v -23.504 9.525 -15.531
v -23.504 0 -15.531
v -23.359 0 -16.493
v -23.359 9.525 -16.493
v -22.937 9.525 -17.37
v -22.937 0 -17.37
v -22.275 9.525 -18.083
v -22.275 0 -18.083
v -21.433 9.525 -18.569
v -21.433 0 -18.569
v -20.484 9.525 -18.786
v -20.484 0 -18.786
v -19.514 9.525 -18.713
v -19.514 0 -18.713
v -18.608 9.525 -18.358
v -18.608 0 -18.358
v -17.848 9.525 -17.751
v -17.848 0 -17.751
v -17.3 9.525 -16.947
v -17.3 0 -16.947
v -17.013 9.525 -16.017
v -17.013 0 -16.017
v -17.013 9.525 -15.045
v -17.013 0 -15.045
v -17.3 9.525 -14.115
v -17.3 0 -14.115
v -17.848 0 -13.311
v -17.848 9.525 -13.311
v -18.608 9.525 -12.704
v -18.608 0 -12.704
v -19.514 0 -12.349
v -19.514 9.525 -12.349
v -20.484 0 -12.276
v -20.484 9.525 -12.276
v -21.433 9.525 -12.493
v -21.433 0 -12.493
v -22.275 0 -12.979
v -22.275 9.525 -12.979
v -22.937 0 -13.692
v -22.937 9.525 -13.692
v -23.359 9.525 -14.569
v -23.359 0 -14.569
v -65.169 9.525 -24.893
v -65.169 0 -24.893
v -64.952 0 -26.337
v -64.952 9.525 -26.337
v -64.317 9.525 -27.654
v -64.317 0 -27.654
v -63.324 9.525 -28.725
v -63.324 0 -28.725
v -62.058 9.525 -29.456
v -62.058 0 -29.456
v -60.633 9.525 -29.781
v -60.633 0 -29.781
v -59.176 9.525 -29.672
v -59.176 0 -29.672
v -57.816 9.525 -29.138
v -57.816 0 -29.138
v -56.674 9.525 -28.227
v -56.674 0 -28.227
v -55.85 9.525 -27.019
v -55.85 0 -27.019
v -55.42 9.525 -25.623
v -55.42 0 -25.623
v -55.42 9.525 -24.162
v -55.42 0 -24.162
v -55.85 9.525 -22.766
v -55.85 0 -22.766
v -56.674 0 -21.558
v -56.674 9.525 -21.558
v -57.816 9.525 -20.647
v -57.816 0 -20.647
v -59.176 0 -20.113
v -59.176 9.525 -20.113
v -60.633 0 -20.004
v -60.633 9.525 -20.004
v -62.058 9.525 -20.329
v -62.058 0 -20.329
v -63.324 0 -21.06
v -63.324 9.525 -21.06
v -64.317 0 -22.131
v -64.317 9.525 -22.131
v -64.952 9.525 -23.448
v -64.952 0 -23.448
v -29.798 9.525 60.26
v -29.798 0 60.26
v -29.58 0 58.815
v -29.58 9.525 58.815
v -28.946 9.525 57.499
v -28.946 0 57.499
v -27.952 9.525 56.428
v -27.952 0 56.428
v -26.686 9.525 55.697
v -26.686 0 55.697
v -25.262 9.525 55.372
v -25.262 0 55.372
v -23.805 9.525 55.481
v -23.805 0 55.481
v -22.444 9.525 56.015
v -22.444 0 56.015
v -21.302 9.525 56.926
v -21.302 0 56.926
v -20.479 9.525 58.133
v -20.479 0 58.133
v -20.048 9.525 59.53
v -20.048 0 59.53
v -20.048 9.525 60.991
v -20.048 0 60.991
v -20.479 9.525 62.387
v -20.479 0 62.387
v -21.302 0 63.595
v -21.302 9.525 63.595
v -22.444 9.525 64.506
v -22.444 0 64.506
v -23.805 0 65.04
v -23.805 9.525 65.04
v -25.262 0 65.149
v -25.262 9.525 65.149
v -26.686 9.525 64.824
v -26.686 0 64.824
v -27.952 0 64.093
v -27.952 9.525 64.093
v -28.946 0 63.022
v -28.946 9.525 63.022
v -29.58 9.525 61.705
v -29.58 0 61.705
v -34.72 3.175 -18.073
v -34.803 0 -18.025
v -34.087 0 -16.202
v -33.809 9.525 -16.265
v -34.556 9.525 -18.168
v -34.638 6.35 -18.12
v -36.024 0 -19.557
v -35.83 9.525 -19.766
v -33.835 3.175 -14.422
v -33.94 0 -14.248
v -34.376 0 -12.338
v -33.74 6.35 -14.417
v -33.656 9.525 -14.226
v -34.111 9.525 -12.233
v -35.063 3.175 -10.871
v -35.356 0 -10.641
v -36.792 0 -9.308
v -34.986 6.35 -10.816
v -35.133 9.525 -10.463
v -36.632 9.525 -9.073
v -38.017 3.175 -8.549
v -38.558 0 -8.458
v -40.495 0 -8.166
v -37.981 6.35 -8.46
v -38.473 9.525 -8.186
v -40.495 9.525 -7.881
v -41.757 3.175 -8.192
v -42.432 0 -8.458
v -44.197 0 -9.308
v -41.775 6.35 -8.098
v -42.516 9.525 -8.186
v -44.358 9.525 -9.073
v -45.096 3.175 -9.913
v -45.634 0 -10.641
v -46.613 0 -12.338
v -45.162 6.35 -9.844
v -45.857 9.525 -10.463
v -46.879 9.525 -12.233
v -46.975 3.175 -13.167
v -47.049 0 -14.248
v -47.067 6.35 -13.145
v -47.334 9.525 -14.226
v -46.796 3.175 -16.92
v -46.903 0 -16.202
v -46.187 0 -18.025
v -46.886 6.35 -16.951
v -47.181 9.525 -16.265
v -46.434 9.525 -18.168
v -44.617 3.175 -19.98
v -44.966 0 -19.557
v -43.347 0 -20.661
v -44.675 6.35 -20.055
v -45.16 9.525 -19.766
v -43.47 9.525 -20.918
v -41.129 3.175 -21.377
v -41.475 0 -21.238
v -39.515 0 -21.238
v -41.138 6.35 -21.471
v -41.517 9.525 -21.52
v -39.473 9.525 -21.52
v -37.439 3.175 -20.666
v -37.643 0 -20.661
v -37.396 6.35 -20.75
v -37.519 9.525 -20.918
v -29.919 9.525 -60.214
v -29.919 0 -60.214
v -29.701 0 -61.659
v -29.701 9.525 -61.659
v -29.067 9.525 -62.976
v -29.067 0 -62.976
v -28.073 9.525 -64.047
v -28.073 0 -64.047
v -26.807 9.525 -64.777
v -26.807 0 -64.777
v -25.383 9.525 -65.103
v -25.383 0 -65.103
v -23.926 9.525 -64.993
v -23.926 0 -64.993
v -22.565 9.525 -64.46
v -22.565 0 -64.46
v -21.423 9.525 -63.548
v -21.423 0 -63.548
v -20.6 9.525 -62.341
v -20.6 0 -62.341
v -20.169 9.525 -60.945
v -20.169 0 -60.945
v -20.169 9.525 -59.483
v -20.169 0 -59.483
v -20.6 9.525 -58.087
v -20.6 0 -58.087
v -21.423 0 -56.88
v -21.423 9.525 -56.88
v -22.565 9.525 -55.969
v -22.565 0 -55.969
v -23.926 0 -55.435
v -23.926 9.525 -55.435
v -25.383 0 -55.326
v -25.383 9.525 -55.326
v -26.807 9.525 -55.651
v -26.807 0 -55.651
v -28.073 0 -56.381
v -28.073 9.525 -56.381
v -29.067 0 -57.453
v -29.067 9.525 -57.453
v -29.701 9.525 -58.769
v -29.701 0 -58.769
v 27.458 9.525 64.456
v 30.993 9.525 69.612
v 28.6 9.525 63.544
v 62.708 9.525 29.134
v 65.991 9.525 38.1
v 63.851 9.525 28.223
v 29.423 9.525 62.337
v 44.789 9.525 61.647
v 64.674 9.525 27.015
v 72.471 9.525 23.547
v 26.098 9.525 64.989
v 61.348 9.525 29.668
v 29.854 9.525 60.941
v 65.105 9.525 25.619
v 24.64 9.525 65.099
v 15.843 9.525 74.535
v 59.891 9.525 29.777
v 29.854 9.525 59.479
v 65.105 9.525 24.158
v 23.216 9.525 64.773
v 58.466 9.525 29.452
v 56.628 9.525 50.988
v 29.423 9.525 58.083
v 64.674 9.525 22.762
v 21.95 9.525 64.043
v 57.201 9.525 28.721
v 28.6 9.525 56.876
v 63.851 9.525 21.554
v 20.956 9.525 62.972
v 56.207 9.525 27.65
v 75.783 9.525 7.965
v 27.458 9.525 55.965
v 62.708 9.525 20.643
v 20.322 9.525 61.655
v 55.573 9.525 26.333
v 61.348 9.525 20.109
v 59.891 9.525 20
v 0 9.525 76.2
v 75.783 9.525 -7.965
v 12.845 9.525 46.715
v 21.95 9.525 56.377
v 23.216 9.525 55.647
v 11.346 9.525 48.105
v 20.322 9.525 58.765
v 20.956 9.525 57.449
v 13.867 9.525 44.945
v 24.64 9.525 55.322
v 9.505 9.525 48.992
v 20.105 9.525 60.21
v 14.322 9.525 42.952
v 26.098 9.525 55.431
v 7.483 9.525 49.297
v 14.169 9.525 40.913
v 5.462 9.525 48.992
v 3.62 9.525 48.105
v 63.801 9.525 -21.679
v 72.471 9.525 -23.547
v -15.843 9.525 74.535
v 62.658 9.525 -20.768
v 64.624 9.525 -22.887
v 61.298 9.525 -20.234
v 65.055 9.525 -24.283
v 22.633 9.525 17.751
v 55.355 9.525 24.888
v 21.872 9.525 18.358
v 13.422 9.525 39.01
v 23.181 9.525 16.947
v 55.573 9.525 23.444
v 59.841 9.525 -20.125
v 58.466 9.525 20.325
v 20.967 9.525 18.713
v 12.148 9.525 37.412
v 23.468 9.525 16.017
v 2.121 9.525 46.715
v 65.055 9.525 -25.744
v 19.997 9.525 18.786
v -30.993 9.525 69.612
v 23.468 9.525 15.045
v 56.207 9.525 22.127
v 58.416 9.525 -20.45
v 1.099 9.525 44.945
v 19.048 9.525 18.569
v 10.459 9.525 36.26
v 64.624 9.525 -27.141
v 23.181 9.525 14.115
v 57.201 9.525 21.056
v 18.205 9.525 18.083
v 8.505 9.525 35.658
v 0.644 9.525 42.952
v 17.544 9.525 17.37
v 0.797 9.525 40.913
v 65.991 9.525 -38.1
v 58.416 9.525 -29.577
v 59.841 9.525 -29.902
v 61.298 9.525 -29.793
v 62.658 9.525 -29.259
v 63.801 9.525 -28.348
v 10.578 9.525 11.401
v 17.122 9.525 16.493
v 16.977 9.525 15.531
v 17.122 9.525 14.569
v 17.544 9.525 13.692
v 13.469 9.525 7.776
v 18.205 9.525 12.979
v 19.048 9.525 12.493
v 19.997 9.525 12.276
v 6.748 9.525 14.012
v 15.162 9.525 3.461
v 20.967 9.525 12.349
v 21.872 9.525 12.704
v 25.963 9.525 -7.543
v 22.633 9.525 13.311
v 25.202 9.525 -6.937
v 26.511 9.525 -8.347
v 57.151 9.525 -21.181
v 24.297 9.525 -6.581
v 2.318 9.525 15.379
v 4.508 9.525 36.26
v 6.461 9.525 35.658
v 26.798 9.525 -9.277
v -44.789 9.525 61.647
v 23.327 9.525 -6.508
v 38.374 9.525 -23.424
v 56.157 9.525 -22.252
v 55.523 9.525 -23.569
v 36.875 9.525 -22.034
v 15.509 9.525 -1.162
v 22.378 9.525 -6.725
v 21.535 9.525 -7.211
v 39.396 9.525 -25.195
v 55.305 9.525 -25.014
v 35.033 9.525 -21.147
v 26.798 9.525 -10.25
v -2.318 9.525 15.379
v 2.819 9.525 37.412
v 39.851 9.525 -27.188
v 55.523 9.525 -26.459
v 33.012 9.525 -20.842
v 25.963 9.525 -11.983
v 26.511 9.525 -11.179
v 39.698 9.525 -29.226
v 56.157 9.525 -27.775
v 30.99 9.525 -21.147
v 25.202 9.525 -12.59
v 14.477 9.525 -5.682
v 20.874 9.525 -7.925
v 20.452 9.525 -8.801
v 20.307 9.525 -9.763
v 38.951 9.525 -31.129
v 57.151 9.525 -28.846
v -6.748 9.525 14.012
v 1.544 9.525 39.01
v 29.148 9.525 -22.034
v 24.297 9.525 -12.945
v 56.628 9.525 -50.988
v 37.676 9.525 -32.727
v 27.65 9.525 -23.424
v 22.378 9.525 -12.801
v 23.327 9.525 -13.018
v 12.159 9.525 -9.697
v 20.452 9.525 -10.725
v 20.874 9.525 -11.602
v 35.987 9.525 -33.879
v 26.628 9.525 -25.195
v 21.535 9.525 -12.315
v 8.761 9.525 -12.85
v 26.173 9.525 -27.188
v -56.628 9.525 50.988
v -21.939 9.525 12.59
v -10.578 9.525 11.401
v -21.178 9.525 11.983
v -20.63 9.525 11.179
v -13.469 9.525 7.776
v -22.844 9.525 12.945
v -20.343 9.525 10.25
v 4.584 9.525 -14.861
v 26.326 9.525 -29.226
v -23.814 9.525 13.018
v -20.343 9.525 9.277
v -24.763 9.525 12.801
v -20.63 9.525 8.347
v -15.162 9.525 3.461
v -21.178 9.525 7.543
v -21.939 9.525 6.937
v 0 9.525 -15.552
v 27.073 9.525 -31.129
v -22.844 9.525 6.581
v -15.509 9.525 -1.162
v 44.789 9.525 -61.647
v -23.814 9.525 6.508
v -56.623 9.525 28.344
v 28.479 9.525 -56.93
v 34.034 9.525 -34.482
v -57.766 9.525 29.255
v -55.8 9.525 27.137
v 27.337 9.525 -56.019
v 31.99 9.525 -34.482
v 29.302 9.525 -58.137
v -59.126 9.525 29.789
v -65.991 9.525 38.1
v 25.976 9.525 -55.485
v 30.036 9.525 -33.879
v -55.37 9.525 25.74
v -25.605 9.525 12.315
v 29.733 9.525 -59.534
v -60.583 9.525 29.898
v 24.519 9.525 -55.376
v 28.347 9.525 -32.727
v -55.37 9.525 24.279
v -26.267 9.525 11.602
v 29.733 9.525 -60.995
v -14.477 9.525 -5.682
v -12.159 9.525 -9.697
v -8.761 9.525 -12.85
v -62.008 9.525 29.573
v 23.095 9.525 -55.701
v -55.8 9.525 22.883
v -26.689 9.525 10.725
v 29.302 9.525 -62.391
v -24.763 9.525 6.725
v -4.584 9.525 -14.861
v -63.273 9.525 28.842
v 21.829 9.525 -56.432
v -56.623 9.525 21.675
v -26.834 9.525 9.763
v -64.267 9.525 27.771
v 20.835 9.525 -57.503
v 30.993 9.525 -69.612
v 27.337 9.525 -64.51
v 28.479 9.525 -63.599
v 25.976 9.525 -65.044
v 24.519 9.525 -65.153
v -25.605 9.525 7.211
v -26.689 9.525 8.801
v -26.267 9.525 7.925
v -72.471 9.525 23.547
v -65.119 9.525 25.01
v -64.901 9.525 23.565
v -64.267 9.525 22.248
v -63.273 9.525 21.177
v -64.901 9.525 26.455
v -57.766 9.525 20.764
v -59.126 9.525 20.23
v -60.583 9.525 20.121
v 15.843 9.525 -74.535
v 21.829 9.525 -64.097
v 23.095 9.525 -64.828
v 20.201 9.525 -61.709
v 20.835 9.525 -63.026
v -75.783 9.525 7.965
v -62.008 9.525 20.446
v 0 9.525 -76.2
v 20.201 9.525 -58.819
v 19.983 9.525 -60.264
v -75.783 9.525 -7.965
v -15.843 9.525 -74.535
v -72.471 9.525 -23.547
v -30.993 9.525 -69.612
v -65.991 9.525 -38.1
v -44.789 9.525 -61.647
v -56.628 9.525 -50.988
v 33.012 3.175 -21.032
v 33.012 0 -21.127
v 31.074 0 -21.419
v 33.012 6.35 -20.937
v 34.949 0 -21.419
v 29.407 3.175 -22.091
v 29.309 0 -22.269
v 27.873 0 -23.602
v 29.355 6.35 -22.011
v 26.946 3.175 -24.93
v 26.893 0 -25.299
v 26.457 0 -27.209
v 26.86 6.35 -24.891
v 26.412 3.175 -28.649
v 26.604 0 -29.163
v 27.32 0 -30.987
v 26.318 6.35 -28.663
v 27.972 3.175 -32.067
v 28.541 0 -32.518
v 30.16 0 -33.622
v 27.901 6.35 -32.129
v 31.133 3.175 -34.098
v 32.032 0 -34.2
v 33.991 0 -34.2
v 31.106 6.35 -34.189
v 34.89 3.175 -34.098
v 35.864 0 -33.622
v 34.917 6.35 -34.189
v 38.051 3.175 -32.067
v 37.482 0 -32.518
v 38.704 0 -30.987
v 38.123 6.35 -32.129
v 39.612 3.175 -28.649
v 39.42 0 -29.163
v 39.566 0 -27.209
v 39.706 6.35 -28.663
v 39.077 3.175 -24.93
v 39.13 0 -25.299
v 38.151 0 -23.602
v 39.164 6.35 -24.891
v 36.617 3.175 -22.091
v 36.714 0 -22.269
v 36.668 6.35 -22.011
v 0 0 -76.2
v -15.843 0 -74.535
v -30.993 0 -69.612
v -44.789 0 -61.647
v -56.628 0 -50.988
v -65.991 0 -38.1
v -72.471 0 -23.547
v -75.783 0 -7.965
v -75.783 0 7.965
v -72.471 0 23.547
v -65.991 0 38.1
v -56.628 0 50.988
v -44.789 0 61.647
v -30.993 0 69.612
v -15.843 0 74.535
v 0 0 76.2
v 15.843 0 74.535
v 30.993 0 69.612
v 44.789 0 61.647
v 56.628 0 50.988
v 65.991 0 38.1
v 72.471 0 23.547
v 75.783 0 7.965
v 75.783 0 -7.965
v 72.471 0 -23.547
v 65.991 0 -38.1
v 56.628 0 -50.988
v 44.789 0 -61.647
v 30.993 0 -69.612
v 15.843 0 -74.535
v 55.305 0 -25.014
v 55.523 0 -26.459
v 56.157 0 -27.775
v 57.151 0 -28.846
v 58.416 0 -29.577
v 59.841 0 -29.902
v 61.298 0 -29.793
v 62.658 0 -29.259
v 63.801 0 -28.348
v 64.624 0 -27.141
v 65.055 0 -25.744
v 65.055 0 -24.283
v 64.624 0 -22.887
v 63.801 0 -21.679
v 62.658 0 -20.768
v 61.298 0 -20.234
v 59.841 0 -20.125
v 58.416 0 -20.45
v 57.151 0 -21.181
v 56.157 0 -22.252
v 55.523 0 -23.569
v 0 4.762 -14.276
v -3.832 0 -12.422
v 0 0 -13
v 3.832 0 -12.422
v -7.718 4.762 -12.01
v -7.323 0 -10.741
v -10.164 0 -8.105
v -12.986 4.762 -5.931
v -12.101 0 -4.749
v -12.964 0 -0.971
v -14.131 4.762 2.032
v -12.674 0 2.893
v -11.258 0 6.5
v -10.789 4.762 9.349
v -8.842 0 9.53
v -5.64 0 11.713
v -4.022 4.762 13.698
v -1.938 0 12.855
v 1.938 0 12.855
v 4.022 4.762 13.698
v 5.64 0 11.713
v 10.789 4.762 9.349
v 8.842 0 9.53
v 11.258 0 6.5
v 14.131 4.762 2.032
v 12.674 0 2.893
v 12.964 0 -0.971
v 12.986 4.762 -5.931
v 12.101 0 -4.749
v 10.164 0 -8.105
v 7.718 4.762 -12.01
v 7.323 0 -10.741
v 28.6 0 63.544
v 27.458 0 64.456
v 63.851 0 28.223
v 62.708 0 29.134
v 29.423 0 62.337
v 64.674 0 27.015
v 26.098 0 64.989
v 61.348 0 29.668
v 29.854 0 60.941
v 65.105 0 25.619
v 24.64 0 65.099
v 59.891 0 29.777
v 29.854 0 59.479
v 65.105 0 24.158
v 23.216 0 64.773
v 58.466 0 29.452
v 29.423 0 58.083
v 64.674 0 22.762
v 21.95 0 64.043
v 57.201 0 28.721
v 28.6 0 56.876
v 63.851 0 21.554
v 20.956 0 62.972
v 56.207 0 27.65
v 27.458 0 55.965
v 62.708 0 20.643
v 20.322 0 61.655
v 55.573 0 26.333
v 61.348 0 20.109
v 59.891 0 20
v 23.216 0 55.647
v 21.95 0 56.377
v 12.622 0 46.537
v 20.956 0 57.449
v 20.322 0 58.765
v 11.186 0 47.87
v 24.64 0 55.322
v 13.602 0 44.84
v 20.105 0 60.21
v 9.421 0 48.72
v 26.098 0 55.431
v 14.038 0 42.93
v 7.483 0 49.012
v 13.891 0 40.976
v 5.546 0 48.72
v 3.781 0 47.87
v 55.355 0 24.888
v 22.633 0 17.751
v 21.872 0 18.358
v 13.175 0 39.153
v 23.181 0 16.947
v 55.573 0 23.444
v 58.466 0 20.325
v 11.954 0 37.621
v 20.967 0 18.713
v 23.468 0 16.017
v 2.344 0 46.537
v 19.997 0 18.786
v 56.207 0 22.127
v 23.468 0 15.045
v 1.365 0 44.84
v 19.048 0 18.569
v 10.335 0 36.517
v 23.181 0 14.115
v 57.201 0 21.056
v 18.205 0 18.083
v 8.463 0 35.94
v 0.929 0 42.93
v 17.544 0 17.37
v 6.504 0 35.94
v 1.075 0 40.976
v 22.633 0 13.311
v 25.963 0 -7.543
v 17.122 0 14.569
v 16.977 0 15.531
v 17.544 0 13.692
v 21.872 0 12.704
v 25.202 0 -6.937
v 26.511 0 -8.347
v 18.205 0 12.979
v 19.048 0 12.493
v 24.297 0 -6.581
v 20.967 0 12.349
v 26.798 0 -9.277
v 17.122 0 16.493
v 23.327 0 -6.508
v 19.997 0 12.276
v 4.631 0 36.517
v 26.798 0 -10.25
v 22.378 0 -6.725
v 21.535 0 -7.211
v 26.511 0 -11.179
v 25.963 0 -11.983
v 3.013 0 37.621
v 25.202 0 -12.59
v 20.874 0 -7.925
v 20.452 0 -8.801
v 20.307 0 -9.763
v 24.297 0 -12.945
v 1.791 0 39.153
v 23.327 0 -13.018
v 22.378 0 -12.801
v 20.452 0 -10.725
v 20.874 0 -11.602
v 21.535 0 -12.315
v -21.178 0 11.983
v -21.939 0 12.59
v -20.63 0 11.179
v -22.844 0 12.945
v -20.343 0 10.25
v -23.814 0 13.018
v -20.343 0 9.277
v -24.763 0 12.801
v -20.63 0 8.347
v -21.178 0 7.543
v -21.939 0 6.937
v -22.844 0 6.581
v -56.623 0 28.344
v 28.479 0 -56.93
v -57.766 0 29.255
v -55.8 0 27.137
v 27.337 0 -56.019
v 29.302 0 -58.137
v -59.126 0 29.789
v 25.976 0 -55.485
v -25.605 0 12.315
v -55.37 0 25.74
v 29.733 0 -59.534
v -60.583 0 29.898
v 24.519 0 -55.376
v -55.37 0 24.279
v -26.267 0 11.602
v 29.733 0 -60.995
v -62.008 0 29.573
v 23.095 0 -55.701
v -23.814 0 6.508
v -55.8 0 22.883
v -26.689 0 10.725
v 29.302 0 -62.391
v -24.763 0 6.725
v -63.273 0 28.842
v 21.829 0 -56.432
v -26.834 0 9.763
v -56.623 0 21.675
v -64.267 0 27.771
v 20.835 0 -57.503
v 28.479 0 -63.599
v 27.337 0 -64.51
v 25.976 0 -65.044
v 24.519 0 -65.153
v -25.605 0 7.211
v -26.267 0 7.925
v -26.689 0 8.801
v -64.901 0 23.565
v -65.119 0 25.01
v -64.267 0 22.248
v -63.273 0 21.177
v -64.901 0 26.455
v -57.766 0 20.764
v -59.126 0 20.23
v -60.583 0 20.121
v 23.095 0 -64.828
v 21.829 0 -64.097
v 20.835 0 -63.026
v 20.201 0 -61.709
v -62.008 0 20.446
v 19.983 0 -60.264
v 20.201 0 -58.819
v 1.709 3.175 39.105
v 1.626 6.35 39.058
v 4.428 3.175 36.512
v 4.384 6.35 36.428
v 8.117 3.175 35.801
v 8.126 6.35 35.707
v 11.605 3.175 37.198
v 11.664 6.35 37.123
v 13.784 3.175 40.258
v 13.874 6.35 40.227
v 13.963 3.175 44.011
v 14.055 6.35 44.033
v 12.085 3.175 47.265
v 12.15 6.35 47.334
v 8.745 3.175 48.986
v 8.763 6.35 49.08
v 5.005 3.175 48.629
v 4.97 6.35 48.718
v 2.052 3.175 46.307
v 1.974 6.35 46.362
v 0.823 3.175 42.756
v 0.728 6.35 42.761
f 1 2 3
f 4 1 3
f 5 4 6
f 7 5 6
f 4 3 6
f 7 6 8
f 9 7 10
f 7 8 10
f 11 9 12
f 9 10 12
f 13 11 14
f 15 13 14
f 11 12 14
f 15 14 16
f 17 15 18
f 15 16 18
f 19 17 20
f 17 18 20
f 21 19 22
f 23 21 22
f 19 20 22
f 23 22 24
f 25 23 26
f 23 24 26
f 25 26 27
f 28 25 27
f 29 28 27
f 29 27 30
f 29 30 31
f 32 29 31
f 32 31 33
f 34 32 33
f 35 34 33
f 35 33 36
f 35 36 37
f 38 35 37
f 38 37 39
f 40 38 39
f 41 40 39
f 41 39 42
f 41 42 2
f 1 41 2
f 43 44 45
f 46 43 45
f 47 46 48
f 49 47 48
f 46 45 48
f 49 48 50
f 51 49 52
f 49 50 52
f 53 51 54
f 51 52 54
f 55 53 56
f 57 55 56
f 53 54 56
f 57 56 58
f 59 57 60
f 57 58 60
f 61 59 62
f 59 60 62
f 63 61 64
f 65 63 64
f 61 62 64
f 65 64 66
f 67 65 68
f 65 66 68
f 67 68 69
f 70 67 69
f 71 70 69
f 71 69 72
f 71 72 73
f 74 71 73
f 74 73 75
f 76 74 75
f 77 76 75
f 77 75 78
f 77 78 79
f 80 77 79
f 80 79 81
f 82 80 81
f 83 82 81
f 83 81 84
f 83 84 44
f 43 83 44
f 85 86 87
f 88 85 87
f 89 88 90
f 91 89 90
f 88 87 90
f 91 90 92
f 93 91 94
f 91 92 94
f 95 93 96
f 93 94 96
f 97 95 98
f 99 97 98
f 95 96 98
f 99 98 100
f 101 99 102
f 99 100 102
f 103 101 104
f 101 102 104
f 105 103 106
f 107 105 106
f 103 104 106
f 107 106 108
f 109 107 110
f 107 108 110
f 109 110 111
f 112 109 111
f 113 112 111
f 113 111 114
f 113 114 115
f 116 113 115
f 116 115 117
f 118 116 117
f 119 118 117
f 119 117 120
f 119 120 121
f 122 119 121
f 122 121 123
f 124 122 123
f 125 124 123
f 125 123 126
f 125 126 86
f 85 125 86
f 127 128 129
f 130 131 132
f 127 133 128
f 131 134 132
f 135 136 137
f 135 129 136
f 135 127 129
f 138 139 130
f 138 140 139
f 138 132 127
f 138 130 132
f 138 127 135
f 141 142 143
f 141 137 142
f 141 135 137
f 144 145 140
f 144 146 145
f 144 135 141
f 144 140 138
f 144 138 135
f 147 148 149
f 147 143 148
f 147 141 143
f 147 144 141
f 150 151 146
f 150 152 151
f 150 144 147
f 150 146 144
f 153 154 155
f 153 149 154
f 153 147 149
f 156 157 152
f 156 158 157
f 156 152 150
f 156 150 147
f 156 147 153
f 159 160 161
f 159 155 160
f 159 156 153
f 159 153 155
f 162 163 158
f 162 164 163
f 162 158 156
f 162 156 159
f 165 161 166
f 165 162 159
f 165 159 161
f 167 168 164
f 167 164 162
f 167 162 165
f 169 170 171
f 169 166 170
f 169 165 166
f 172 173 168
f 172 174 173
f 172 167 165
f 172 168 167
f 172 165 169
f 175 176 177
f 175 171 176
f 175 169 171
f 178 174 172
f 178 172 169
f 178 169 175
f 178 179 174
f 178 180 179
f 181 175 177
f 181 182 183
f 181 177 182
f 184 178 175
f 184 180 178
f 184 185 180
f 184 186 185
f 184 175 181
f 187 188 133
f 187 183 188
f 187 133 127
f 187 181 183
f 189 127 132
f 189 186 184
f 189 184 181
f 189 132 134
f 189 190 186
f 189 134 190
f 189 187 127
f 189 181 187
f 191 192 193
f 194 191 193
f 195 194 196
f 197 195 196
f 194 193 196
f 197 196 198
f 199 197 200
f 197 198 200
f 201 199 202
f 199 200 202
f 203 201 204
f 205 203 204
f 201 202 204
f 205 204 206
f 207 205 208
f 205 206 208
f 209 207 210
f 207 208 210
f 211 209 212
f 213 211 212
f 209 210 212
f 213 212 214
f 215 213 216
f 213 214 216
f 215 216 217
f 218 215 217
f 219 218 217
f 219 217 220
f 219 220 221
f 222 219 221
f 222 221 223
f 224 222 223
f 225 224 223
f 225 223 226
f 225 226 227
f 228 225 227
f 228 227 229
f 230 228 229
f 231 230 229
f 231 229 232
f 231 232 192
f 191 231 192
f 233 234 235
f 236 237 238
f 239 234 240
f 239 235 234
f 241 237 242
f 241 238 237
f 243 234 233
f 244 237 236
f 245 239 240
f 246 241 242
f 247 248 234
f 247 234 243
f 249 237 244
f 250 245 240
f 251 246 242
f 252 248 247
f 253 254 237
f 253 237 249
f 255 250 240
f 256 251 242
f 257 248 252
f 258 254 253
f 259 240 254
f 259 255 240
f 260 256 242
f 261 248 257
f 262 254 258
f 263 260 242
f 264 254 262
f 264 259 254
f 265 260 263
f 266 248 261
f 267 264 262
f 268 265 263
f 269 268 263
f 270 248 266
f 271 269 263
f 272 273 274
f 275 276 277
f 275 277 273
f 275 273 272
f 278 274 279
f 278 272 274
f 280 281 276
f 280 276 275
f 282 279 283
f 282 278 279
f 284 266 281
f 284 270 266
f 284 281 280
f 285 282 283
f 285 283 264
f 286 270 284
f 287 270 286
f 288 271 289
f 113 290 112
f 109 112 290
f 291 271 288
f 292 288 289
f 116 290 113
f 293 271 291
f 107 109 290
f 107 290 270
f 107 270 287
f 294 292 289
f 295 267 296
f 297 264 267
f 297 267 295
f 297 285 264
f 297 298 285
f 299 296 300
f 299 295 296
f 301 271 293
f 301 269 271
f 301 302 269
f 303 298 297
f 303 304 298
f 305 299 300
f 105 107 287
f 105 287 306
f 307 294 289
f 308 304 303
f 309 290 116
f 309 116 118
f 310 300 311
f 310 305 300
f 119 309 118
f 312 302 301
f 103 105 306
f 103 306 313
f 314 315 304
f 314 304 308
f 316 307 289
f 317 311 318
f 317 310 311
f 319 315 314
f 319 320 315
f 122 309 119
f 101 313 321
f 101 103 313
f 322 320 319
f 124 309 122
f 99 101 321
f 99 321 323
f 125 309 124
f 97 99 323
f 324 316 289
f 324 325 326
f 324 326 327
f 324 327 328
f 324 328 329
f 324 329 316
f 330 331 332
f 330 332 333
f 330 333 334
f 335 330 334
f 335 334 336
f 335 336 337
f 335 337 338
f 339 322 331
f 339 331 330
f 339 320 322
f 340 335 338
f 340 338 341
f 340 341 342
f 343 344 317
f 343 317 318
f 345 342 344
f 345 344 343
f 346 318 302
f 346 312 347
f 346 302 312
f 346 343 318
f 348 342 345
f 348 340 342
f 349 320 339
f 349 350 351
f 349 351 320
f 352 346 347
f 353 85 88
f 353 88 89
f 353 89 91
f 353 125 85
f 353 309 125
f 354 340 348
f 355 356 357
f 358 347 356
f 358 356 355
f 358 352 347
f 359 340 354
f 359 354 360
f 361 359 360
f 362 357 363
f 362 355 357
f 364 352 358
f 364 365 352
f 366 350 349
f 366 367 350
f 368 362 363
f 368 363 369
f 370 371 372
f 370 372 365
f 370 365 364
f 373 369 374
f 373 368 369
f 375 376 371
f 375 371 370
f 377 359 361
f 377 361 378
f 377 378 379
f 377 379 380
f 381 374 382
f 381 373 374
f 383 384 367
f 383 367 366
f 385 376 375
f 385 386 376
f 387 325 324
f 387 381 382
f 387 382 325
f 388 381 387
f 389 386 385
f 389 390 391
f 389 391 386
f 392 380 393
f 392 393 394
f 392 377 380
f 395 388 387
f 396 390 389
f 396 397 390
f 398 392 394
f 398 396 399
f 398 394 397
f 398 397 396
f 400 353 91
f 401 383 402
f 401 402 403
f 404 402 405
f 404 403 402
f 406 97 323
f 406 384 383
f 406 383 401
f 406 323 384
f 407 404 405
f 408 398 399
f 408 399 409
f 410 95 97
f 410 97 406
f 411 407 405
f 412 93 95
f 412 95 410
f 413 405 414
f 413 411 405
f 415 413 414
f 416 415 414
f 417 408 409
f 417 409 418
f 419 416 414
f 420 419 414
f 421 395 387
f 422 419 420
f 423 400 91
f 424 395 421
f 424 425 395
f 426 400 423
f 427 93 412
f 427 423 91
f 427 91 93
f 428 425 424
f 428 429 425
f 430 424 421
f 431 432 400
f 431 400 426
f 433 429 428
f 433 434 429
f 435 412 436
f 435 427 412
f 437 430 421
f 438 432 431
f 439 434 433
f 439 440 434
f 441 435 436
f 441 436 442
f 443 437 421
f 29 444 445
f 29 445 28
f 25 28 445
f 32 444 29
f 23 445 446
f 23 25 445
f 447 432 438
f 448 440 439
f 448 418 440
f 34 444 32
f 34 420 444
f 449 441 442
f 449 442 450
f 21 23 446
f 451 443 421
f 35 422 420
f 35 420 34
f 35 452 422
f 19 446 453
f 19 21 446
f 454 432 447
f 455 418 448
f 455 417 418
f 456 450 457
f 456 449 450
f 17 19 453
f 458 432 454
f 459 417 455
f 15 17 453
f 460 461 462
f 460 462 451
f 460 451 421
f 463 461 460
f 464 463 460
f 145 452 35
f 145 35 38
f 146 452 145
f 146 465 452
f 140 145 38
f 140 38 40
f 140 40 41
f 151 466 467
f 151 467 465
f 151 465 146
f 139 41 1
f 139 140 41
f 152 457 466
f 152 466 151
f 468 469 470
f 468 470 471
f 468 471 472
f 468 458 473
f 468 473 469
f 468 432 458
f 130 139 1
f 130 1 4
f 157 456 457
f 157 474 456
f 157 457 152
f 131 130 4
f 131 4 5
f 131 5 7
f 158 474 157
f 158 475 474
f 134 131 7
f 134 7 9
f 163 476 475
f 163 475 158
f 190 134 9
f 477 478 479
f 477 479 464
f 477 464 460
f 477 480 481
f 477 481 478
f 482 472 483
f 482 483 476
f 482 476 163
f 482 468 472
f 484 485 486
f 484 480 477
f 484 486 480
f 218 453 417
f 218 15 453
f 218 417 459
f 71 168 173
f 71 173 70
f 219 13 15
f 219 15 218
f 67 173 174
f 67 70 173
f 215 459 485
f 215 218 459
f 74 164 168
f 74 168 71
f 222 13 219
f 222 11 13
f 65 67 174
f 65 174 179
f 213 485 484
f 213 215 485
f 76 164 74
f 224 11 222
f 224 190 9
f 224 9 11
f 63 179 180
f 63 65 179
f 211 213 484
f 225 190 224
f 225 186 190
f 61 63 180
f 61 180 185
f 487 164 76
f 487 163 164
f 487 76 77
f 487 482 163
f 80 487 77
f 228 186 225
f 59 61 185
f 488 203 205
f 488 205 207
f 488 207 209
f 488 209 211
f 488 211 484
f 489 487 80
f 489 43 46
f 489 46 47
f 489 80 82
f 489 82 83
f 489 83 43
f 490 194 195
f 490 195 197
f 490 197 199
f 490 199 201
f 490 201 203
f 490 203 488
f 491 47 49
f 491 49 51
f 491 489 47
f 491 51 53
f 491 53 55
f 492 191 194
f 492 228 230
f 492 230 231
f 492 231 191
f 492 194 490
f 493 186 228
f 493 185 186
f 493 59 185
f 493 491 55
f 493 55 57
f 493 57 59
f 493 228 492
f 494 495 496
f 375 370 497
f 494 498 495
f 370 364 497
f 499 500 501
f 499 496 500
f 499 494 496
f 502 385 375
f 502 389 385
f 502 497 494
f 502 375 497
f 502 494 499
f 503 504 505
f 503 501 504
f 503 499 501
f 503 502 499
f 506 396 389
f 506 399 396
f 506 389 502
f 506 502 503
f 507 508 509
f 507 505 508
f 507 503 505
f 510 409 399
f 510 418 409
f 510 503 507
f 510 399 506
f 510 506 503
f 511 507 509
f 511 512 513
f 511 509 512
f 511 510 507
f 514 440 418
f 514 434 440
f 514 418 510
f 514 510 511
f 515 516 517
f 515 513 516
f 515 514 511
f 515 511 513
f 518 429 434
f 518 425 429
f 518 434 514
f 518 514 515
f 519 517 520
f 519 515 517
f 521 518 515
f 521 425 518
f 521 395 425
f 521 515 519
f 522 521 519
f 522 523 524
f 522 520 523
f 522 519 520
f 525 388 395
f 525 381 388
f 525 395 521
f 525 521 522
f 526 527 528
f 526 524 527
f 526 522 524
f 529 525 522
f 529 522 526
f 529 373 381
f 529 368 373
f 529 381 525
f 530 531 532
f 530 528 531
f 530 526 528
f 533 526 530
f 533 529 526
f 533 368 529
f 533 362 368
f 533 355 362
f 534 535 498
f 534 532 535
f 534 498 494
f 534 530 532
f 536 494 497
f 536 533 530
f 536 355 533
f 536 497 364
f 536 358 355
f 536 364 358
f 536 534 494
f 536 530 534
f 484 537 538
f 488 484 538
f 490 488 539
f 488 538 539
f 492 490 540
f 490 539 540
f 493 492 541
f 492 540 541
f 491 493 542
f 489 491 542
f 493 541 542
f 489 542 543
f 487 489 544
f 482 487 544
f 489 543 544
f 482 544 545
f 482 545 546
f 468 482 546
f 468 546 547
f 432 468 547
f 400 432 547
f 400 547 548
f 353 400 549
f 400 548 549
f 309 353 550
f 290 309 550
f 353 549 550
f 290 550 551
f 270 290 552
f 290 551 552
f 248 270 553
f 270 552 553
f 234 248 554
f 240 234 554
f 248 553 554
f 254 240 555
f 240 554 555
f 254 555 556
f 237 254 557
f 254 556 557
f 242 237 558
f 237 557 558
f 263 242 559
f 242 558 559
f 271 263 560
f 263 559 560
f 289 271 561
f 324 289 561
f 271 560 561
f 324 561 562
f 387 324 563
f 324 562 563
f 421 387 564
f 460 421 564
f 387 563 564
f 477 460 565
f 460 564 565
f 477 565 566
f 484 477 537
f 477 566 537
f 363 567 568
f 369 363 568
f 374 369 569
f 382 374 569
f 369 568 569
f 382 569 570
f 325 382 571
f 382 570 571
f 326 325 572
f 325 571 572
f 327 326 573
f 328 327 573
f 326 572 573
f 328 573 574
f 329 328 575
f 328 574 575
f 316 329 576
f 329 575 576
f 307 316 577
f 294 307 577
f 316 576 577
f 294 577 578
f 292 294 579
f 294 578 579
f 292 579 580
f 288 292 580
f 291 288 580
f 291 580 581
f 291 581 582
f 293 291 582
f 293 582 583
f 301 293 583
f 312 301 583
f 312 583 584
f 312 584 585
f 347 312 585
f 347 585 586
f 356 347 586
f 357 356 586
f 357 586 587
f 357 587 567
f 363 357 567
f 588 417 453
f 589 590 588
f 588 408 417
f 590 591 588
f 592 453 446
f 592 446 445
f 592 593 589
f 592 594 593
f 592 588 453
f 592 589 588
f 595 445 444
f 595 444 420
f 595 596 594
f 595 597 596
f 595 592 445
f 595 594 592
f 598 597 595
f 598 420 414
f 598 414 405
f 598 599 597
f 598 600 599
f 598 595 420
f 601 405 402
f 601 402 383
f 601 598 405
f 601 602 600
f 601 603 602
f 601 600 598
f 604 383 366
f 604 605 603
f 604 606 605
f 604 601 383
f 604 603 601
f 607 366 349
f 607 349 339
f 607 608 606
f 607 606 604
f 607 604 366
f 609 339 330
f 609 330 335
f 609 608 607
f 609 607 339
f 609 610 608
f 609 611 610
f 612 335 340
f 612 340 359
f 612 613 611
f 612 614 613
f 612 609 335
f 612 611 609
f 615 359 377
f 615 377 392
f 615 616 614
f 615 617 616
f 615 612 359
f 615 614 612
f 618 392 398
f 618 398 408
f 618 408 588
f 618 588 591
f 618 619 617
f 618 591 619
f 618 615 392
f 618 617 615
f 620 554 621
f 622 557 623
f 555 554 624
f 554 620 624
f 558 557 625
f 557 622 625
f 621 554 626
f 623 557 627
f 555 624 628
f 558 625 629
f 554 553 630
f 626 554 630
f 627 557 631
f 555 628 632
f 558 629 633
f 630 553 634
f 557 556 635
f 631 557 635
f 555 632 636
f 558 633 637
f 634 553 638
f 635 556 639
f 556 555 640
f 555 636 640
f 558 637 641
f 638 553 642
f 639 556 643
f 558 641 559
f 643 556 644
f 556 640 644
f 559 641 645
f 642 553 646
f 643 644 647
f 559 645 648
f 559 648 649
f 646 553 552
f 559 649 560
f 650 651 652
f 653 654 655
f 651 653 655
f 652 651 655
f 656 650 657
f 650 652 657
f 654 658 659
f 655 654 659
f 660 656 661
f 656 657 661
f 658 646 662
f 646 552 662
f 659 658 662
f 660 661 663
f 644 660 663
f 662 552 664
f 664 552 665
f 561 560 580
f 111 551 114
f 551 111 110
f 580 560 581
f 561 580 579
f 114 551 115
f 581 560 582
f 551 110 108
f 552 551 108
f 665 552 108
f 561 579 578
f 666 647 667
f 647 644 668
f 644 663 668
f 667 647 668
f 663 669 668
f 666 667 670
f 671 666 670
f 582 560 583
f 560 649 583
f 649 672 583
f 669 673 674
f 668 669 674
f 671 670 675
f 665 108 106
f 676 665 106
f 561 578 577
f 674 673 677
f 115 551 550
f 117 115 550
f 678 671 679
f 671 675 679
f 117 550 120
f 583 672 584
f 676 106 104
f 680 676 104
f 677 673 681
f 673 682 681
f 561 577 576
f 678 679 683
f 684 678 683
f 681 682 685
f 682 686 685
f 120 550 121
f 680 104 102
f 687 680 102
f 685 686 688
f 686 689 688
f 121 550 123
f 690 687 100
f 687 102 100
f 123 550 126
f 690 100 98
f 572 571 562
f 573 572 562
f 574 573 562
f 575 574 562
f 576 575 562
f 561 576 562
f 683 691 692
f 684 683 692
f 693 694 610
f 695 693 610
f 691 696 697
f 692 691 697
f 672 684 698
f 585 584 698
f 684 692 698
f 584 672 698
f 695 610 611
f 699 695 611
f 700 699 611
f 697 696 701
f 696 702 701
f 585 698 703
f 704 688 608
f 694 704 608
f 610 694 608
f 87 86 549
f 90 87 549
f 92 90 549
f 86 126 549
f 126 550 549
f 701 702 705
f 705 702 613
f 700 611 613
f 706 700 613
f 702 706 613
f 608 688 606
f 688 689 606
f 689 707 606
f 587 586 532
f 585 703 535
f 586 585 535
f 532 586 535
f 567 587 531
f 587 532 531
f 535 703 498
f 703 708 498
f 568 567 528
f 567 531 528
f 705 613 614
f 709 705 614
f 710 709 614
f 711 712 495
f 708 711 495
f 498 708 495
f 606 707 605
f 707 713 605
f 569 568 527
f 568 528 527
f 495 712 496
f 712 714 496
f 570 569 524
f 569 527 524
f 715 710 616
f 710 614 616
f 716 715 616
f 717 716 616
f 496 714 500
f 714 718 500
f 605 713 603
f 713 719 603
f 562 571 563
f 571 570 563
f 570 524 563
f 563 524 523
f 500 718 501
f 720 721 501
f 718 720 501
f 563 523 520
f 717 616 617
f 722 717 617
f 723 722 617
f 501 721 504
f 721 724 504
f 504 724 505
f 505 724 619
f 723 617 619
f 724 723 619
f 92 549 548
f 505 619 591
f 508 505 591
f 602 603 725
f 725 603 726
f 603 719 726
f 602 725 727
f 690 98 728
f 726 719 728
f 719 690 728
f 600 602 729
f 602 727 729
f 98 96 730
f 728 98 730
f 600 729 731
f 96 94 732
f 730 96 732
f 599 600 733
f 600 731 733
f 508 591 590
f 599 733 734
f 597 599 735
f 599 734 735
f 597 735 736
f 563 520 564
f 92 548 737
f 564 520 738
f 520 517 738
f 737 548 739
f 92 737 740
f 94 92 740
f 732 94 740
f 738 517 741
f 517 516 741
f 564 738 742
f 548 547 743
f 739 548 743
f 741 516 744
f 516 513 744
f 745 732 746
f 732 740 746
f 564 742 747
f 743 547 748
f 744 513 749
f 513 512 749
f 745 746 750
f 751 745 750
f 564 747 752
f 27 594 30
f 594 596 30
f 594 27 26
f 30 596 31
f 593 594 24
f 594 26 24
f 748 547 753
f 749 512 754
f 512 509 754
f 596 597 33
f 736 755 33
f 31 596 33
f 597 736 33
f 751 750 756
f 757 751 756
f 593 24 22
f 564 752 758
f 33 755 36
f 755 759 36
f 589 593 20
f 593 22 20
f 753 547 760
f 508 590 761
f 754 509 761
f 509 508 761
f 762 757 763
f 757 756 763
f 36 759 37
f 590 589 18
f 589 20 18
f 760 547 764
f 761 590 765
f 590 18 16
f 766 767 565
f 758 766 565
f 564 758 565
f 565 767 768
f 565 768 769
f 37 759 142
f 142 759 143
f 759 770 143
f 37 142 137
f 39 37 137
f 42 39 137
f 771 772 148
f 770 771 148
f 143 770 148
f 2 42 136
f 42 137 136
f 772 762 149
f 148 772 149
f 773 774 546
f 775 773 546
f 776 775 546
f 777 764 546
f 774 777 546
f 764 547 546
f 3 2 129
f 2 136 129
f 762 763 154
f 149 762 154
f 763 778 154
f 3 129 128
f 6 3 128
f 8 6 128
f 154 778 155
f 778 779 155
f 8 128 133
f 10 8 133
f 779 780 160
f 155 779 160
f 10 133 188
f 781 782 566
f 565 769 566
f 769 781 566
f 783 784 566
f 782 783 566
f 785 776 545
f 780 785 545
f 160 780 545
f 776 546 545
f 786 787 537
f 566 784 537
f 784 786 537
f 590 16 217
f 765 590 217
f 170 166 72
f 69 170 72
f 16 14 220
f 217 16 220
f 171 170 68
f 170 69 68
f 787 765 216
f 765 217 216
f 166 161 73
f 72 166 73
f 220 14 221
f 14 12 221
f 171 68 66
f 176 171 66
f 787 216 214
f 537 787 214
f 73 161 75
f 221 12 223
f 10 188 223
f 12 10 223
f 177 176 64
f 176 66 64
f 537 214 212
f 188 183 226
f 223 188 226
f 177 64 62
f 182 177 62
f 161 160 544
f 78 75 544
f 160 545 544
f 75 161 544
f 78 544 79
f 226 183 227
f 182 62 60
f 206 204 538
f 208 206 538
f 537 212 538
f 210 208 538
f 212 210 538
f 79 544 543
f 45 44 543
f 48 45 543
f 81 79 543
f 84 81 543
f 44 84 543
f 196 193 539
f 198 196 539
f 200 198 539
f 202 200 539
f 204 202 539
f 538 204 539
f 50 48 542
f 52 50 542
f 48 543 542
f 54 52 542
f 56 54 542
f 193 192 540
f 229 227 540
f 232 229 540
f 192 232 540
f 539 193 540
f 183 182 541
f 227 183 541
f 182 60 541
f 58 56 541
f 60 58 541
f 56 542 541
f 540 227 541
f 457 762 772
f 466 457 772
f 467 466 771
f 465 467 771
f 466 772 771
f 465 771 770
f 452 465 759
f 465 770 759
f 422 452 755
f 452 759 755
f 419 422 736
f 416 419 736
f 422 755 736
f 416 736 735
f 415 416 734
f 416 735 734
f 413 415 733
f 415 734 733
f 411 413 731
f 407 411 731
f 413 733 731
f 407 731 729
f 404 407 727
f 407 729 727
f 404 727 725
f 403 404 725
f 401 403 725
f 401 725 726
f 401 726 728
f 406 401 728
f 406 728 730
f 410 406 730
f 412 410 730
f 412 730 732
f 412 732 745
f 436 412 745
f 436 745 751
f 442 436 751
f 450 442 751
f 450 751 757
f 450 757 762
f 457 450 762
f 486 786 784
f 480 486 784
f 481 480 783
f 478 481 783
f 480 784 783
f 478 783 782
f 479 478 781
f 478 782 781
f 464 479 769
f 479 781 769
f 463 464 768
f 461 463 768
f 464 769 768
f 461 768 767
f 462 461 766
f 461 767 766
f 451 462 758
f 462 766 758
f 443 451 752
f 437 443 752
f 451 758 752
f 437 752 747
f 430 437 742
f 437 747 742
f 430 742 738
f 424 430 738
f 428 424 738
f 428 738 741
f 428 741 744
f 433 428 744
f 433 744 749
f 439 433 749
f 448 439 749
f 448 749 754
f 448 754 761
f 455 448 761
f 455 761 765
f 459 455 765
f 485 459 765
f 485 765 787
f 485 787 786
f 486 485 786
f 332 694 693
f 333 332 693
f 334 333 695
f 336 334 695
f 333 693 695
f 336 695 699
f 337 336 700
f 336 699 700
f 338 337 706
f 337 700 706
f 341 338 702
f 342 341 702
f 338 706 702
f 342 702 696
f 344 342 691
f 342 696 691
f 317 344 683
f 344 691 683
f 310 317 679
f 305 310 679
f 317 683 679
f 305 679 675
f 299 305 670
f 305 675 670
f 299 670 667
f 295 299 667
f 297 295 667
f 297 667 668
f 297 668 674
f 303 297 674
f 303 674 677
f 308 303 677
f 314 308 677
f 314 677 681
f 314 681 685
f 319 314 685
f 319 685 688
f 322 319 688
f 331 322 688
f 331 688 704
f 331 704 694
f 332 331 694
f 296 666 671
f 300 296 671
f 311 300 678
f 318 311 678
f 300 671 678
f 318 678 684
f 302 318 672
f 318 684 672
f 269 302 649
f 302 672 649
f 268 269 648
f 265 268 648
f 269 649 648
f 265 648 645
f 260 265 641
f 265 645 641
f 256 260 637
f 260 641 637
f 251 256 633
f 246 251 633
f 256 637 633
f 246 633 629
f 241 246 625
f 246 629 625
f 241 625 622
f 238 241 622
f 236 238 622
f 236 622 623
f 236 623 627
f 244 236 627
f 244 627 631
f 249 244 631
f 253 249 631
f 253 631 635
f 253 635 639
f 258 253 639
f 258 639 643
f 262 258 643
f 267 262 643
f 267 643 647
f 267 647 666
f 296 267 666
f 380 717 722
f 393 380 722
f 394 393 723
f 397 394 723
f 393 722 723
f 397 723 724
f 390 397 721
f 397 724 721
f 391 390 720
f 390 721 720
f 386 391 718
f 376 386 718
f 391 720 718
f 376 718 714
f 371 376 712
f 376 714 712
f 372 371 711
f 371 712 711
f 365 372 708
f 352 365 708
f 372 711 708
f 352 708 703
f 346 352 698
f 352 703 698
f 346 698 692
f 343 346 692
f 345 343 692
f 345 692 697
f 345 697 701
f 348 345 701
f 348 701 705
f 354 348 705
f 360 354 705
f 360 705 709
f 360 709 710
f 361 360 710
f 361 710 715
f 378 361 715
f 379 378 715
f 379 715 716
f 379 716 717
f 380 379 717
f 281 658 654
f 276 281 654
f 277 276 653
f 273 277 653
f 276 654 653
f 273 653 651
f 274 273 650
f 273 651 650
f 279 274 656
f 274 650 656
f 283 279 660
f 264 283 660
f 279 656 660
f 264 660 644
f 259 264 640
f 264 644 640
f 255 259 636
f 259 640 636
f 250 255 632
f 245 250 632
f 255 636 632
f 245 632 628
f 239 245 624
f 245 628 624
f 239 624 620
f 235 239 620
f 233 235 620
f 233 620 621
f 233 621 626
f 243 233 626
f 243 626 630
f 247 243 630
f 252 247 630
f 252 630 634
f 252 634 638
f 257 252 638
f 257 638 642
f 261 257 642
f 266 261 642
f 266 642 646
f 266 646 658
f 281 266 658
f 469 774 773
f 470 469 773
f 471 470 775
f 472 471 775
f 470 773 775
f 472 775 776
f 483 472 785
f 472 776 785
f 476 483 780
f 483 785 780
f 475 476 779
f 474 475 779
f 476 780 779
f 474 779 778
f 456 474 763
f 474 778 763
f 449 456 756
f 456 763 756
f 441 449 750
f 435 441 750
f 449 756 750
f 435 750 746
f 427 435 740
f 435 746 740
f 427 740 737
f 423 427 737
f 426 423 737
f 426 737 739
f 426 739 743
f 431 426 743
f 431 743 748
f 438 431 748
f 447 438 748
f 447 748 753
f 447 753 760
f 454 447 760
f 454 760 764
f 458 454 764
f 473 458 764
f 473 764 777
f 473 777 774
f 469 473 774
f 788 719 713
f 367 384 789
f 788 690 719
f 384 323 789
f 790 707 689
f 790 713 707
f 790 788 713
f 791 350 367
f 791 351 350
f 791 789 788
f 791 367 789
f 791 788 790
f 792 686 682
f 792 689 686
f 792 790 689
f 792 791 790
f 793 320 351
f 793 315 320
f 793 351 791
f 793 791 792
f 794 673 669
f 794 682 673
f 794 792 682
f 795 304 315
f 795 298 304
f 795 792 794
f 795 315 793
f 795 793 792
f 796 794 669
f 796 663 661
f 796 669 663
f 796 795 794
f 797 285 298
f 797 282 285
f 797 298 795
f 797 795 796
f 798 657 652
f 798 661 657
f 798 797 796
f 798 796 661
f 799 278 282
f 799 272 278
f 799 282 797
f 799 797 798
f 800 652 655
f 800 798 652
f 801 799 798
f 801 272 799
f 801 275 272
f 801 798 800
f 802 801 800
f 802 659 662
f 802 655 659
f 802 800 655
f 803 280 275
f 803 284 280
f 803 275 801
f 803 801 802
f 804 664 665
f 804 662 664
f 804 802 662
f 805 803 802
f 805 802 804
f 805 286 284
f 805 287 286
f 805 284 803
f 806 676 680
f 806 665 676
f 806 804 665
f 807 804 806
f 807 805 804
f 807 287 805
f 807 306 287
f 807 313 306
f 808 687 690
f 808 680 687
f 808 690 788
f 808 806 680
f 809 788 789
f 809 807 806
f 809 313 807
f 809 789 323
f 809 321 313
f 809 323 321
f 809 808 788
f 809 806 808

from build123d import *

# Parameters (mm, degrees)
SKETCH1_R               = 76.2
BOSS_EXTRUDE1_DEPTH     = 9.525
CIRPATTERN6_COUNT       = 3
F_3_8_CLEARANCE_HOLE1_D = 9.8044
F_1_4_CLEARANCE_HOLE1_D = 6.5278


with BuildPart() as part:
    # Sketch1 → Boss-Extrude1 (new body)
    with BuildSketch(Plane(origin=(0, 0, 0), x_dir=(1, 0, 0), z_dir=(0, 1, 0))):
        with Locations(Location((0, 0, 0), (0, 0, 90))):
            Circle(SKETCH1_R)
    extrude(amount=BOSS_EXTRUDE1_DEPTH)

    # Sketch5 → Cut-Revolve1 (revolve, cut)
    with BuildSketch(Plane.XY, mode=Mode.PRIVATE) as cut_revolve1_sk:
        Polygon((0, 0), (0, 9.525), (15.552216058, 9.525), (13, 0), align=None)
    revolve(cut_revolve1_sk.sketch.rotate(Axis((0, 0, 0), (0, 1, 0)), 90), axis=Axis((0, 0, 0), (0, 1, 0)), mode=Mode.SUBTRACT)

    # Sketch15 → 1/4 NPT Tapped Hole1 (revolve, cut)
    with BuildSketch(Plane(origin=(33.011727721, 9.525, -27.700128555), x_dir=(0, 0, 1), z_dir=(1, 0, 0))):
        Polygon((0, 0), (0, 9.525), (5.5626, 9.525), (5.5626, 10.0203), (6.557978799, 10.0203), (6.858, 0), align=None)
    f_1_4_npt_tapped_hole1 = revolve(axis=Axis((33.011727721, 15.875, -27.700128555), (0, -1, 0)), mode=Mode.SUBTRACT)

    # CirPattern6: 1/4 NPT Tapped Hole1 ×3 about axis
    cirpattern6_axis = Axis((0, 0, 0), (0, 1, 0))
    for i in range(1, CIRPATTERN6_COUNT):
        add(f_1_4_npt_tapped_hole1.rotate(cirpattern6_axis, i * 360 / CIRPATTERN6_COUNT), mode=Mode.SUBTRACT)

    # 3/8 Clearance Hole1 (through all)
    with Locations(Plane(origin=(0, 9.525, 0), x_dir=(1, 0, 0), z_dir=(0, 1, 0))):
        with Locations((60.207217661, 25.013604371), (60.257374801, -24.888494705), (24.885638551, 60.264250563), (-25.016460514, 60.214093421), (-60.267106699, 24.892514335), (-60.216949569, -25.009584719), (-24.895370482, -60.260230921), (25.006728592, -60.210073801)):
            Hole(F_3_8_CLEARANCE_HOLE1_D / 2)

    # 1/4 Clearance Hole1 (through all)
    with Locations(Plane(origin=(0, 9.525, 0), x_dir=(1, 0, 0), z_dir=(0, 1, 0))):
        with Locations((-20.240427094, 15.531025958), (20.240427094, -15.531025958), (-23.570476573, -9.763211068), (23.570476573, 9.763211068)):
            Hole(F_1_4_CLEARANCE_HOLE1_D / 2)


solid = part.part
